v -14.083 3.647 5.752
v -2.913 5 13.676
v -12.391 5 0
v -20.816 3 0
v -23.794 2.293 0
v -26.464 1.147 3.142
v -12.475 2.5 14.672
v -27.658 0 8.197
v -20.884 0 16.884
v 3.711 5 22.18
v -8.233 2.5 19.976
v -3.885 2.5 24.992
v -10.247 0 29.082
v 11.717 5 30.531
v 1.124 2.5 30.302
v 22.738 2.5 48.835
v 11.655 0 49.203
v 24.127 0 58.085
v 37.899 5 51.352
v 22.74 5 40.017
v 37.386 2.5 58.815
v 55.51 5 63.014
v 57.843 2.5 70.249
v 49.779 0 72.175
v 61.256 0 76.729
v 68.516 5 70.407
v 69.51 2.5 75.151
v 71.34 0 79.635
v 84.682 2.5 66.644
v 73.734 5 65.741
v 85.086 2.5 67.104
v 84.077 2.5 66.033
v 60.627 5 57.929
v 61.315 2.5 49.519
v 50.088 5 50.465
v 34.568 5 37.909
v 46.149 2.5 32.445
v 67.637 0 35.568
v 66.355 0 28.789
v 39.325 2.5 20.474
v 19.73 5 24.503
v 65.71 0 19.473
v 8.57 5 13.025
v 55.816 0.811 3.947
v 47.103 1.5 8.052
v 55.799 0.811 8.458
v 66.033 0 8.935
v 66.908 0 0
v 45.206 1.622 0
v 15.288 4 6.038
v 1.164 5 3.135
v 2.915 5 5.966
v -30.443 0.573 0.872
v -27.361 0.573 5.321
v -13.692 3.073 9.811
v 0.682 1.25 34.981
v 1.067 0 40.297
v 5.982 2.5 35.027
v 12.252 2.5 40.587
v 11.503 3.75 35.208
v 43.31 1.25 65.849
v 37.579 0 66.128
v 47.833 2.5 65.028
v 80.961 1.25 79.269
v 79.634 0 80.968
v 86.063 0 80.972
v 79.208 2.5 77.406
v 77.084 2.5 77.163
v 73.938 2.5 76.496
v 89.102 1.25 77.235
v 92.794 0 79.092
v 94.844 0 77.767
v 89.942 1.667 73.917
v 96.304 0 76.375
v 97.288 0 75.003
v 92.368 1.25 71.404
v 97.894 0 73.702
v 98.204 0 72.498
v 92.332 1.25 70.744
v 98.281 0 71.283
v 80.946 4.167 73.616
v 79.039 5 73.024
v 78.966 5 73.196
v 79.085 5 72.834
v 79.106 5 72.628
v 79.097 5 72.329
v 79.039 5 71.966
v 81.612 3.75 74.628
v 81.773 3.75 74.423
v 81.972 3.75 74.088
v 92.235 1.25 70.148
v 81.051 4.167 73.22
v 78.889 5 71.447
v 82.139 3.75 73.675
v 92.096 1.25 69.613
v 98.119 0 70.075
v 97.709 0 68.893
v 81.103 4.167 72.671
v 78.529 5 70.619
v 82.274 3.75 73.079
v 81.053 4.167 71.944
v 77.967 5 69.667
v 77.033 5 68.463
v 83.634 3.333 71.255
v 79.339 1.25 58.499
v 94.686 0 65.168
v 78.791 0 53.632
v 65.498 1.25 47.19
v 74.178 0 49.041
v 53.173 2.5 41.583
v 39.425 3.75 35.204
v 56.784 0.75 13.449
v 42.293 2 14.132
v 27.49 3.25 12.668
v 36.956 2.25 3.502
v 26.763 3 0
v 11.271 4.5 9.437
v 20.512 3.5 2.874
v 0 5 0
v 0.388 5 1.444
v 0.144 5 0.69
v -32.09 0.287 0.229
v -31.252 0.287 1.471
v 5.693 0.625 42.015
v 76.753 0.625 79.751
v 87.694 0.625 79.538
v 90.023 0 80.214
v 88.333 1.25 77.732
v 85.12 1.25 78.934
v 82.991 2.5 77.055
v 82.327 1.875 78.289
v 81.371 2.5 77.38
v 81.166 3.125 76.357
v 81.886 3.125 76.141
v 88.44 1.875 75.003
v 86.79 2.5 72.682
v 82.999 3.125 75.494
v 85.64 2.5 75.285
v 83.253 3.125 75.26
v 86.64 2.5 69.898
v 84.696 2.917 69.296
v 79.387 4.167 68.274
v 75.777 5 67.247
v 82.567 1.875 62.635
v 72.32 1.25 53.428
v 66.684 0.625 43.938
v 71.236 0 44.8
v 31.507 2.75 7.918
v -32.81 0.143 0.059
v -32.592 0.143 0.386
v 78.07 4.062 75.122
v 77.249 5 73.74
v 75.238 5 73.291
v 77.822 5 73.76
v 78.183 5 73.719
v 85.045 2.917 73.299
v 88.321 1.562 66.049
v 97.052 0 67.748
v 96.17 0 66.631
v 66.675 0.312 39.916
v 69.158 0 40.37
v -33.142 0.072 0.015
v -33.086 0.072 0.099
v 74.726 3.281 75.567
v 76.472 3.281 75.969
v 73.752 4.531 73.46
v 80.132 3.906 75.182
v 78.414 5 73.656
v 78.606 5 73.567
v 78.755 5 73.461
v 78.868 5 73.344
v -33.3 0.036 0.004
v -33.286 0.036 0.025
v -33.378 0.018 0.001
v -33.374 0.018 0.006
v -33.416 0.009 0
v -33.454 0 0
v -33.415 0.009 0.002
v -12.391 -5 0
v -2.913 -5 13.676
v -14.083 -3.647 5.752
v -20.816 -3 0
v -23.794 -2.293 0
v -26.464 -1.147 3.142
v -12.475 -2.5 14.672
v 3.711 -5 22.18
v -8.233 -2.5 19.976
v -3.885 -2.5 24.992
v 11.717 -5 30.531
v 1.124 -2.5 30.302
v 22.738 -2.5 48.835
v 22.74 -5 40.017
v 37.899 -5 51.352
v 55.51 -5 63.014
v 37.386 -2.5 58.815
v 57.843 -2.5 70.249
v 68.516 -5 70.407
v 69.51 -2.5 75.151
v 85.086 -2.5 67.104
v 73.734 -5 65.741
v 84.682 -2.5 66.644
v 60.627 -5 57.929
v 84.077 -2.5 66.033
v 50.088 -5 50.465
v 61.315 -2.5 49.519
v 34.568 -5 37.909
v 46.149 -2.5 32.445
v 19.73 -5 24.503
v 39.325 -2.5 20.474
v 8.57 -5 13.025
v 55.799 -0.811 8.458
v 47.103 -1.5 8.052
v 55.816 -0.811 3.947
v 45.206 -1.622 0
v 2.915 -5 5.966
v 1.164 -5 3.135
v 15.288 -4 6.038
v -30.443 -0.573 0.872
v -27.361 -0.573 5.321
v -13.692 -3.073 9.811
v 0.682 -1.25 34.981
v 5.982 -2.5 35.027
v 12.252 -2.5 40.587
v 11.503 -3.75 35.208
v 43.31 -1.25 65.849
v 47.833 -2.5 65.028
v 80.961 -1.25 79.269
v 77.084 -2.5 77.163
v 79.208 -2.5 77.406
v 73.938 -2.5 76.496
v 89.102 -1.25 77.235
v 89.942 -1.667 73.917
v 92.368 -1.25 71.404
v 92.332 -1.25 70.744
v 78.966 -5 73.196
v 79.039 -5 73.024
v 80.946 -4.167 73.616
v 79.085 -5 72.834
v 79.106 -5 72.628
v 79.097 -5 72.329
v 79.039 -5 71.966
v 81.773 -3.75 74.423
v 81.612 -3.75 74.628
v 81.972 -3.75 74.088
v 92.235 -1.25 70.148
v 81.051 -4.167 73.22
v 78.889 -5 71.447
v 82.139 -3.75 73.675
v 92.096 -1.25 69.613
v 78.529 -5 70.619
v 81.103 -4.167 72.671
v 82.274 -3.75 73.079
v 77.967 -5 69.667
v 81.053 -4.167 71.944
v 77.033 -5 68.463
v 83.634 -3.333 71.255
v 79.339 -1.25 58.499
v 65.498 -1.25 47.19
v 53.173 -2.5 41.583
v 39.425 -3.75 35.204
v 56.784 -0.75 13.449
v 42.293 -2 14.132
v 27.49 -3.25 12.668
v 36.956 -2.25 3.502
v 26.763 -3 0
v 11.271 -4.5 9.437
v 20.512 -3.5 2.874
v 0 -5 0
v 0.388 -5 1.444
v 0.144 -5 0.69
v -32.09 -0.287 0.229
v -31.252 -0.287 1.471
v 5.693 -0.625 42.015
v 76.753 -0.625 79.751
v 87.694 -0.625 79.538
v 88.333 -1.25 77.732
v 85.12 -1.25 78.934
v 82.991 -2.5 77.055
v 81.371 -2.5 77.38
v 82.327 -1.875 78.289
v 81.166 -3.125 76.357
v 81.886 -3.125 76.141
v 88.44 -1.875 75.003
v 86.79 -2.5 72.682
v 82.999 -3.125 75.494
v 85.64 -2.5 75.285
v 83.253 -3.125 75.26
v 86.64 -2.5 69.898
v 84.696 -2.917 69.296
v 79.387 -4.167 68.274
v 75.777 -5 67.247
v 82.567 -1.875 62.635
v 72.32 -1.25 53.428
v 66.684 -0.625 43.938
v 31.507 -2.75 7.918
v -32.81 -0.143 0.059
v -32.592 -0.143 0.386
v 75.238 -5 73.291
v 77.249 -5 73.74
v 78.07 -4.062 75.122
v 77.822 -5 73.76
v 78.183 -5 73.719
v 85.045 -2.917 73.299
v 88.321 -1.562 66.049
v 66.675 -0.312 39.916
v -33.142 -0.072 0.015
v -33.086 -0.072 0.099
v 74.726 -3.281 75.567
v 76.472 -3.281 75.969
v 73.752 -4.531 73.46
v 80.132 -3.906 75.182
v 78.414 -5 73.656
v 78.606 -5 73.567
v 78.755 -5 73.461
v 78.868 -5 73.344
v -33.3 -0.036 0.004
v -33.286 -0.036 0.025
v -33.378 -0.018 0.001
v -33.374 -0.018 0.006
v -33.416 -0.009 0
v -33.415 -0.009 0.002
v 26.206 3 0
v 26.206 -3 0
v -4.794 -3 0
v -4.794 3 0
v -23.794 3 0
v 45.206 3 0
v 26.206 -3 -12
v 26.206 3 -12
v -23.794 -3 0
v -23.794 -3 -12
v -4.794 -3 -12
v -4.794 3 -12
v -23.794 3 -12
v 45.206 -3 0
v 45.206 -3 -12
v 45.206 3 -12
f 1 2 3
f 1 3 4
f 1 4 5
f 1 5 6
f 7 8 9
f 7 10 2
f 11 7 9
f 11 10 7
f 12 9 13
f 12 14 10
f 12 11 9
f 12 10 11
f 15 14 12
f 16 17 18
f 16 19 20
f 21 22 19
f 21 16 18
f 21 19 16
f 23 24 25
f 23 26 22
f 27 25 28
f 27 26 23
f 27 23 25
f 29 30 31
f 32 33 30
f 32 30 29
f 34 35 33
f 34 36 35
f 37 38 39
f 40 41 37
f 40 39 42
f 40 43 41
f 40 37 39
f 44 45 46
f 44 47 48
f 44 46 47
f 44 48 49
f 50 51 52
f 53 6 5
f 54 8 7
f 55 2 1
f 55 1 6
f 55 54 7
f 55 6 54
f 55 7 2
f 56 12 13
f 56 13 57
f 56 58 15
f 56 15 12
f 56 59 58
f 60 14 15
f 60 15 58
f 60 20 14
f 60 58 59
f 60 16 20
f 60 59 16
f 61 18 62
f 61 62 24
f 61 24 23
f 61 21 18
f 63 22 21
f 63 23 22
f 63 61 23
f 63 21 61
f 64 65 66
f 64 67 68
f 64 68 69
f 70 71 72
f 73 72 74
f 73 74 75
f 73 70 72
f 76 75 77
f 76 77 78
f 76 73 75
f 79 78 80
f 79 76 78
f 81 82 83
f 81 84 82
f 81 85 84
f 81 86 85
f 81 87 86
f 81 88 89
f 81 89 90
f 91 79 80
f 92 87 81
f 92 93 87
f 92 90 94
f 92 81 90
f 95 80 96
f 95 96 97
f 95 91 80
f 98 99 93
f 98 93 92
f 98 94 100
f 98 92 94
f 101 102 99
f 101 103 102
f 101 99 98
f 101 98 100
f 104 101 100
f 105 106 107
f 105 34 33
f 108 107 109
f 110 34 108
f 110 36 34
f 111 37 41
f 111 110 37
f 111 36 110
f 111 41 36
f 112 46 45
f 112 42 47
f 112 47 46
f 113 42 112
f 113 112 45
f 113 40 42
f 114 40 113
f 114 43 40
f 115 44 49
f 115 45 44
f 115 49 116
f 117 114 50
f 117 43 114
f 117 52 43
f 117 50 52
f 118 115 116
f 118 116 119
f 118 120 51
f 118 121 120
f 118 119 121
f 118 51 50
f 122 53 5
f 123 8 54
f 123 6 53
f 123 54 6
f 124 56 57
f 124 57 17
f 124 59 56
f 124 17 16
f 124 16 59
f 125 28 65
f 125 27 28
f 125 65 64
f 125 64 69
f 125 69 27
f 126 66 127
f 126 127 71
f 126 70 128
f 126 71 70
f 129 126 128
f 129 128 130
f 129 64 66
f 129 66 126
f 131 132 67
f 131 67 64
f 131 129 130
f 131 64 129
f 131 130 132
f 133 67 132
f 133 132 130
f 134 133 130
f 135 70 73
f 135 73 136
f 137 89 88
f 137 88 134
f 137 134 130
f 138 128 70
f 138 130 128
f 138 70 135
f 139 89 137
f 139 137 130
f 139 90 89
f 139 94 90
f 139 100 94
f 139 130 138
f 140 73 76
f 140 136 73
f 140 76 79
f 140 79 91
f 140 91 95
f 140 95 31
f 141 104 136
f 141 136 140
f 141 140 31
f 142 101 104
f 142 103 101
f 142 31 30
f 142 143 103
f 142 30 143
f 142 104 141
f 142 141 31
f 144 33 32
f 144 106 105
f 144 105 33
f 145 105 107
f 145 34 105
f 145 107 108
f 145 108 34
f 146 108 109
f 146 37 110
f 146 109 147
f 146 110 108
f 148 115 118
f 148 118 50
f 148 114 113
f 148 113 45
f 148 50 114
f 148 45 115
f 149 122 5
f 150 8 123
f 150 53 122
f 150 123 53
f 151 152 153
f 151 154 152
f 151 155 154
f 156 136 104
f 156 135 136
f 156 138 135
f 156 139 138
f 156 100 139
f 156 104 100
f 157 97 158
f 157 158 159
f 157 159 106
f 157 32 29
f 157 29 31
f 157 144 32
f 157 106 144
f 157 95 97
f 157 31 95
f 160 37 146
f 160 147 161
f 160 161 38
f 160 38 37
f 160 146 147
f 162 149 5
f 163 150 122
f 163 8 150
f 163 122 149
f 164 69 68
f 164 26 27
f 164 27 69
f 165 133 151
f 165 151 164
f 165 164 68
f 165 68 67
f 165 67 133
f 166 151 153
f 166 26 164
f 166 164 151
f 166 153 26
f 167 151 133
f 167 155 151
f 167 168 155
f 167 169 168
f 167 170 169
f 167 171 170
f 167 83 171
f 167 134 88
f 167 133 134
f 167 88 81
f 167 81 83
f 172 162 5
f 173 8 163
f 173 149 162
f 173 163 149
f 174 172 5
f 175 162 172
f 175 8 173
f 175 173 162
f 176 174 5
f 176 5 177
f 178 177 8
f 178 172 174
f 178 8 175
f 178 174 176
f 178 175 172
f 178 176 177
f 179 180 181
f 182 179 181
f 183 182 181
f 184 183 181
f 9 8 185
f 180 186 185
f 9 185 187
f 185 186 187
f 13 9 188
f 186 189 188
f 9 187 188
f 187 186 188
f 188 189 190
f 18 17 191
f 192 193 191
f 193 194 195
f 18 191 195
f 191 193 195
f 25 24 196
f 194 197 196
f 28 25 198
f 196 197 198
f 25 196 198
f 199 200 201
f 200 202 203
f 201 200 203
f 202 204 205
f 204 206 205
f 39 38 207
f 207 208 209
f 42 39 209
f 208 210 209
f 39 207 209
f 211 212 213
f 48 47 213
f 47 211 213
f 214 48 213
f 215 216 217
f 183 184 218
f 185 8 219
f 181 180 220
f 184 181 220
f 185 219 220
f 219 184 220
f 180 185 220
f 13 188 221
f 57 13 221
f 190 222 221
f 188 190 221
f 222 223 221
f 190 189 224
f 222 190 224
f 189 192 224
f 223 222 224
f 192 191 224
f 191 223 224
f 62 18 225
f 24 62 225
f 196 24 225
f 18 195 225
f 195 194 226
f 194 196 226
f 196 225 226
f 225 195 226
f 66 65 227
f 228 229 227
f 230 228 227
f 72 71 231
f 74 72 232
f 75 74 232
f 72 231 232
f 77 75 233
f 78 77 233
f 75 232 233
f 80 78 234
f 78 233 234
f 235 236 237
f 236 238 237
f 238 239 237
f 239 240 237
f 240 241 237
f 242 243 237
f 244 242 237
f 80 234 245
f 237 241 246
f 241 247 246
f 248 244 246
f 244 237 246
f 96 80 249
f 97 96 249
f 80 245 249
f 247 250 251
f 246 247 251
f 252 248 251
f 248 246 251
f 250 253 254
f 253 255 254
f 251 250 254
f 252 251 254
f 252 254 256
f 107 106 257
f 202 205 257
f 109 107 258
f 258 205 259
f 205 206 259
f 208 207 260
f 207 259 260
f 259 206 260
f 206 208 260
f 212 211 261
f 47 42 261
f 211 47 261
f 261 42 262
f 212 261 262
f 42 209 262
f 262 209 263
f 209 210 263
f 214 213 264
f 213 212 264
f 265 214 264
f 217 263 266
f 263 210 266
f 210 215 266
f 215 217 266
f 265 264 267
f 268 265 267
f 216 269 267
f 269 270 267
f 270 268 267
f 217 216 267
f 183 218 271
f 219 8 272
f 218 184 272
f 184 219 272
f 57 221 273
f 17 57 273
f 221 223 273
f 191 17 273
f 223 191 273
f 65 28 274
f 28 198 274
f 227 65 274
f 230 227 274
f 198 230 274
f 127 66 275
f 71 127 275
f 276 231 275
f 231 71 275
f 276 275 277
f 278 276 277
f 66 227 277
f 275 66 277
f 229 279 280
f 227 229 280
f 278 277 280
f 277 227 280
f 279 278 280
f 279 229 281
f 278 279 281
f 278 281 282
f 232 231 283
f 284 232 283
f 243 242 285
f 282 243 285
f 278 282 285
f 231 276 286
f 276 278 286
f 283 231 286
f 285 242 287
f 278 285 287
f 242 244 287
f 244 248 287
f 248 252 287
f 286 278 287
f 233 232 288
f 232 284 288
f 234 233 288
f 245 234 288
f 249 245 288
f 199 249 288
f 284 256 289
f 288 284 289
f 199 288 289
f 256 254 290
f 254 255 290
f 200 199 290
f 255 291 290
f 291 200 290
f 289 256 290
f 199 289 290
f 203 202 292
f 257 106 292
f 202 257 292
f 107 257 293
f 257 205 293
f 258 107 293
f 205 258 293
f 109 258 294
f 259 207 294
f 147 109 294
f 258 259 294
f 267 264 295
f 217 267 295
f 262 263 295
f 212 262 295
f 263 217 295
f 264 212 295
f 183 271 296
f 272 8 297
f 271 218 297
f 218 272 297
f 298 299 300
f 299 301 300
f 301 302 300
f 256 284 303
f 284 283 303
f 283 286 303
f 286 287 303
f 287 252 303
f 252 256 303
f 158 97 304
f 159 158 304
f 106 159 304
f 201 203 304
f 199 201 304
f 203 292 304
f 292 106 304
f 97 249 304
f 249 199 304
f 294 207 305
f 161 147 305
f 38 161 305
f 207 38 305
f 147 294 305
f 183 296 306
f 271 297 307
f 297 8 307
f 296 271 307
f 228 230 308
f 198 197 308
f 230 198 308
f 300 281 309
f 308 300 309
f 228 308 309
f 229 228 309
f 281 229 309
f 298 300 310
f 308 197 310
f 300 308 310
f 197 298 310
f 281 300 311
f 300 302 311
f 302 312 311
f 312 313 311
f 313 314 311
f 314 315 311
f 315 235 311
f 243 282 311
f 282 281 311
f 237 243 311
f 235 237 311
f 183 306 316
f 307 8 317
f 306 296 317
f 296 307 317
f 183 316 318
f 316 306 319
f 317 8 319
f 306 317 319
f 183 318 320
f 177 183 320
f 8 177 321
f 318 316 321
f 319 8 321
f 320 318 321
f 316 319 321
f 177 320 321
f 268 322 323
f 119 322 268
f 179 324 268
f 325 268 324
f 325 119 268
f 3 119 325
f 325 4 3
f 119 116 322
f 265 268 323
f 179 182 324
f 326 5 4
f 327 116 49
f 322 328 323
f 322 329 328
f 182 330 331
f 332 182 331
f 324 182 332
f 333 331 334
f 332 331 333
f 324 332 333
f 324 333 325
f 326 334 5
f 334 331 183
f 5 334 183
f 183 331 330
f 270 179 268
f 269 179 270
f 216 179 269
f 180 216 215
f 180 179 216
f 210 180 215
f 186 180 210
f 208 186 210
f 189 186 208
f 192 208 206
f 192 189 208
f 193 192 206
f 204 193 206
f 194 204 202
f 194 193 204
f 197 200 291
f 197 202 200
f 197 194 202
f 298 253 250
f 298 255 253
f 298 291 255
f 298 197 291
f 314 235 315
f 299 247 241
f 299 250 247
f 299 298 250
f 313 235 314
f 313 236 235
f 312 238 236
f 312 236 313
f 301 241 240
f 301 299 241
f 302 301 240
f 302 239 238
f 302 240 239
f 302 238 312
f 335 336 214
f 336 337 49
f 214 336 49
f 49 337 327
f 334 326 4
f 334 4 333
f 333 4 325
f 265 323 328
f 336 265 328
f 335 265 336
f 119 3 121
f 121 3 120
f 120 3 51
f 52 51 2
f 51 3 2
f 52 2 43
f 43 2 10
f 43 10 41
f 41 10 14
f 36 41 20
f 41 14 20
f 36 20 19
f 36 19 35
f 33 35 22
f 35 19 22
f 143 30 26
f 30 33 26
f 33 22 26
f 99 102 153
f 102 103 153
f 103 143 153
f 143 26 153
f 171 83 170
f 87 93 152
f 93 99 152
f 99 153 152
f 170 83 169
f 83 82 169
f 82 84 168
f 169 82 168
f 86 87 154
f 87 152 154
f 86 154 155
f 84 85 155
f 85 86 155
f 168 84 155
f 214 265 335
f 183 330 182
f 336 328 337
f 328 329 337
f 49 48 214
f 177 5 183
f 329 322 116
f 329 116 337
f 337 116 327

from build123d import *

# Parameters (mm, degrees)
F5_W     = 19
F5_H     = 12
F6_DEPTH = 3


with BuildPart() as f3:
    # F0 (on Front) → F3 section 0
    with BuildSketch(Plane.XZ):
        with BuildLine():
            add(Edge.make_bspline(
                [(-33.4539487958, 0), (-33.4539475141, 0), (1.8967446088, 54.4877709826), (87.6792873597, 91.6592373474), (104.7614702217, 65.474297534), (62.0720738186, 52.2220753998), (65.4690045649, 12.016653457), (66.9079050422, 0)],
                knots=[0, 0, 0, 0, 0.2258859795, 0.5122183994, 0.6229913169, 0.7959413028, 1, 1, 1, 1], degree=3))
            Line((-33.4539487958, 0), (66.9079050422, 0))
        make_face()
    # F2 (on offset) → F3 section 1
    with BuildSketch(Plane.XZ.offset(5)):
        with BuildLine():
            add(Edge.make_bspline(
                [(-12.3913707212, 0), (-4.3907383925, 10.8659039807), (5.5855721966, 32.4205796435), (83.1861544033, 82.0508925585), (76.9843234234, 65.810450768), (58.1651473267, 60.4997302931), (1.3900142987, 9.9120248782), (0, 0)],
                knots=[0, 0, 0, 0, 0.2108575974, 0.4883367114, 0.5577546823, 0.7117913524, 1, 1, 1, 1], degree=3))
            Line((-12.3913707212, 0), (0, 0))
        make_face()
    loft()

    # F4: F3 across plane


with BuildPart() as f3_1:
    add(f3.part)
    add(f3.part.mirror(Plane.XZ))

    # F5 (on Front) → F6 (join, symmetric)
    with BuildSketch(Plane.XZ):
        with Locations((35.7055166066, -6)):
            Rectangle(F5_W, F5_H)
        with Locations((-14.2944833934, -6)):
            Rectangle(F5_W, F5_H)
    extrude(amount=F6_DEPTH, both=True)


solid = f3_1.part
